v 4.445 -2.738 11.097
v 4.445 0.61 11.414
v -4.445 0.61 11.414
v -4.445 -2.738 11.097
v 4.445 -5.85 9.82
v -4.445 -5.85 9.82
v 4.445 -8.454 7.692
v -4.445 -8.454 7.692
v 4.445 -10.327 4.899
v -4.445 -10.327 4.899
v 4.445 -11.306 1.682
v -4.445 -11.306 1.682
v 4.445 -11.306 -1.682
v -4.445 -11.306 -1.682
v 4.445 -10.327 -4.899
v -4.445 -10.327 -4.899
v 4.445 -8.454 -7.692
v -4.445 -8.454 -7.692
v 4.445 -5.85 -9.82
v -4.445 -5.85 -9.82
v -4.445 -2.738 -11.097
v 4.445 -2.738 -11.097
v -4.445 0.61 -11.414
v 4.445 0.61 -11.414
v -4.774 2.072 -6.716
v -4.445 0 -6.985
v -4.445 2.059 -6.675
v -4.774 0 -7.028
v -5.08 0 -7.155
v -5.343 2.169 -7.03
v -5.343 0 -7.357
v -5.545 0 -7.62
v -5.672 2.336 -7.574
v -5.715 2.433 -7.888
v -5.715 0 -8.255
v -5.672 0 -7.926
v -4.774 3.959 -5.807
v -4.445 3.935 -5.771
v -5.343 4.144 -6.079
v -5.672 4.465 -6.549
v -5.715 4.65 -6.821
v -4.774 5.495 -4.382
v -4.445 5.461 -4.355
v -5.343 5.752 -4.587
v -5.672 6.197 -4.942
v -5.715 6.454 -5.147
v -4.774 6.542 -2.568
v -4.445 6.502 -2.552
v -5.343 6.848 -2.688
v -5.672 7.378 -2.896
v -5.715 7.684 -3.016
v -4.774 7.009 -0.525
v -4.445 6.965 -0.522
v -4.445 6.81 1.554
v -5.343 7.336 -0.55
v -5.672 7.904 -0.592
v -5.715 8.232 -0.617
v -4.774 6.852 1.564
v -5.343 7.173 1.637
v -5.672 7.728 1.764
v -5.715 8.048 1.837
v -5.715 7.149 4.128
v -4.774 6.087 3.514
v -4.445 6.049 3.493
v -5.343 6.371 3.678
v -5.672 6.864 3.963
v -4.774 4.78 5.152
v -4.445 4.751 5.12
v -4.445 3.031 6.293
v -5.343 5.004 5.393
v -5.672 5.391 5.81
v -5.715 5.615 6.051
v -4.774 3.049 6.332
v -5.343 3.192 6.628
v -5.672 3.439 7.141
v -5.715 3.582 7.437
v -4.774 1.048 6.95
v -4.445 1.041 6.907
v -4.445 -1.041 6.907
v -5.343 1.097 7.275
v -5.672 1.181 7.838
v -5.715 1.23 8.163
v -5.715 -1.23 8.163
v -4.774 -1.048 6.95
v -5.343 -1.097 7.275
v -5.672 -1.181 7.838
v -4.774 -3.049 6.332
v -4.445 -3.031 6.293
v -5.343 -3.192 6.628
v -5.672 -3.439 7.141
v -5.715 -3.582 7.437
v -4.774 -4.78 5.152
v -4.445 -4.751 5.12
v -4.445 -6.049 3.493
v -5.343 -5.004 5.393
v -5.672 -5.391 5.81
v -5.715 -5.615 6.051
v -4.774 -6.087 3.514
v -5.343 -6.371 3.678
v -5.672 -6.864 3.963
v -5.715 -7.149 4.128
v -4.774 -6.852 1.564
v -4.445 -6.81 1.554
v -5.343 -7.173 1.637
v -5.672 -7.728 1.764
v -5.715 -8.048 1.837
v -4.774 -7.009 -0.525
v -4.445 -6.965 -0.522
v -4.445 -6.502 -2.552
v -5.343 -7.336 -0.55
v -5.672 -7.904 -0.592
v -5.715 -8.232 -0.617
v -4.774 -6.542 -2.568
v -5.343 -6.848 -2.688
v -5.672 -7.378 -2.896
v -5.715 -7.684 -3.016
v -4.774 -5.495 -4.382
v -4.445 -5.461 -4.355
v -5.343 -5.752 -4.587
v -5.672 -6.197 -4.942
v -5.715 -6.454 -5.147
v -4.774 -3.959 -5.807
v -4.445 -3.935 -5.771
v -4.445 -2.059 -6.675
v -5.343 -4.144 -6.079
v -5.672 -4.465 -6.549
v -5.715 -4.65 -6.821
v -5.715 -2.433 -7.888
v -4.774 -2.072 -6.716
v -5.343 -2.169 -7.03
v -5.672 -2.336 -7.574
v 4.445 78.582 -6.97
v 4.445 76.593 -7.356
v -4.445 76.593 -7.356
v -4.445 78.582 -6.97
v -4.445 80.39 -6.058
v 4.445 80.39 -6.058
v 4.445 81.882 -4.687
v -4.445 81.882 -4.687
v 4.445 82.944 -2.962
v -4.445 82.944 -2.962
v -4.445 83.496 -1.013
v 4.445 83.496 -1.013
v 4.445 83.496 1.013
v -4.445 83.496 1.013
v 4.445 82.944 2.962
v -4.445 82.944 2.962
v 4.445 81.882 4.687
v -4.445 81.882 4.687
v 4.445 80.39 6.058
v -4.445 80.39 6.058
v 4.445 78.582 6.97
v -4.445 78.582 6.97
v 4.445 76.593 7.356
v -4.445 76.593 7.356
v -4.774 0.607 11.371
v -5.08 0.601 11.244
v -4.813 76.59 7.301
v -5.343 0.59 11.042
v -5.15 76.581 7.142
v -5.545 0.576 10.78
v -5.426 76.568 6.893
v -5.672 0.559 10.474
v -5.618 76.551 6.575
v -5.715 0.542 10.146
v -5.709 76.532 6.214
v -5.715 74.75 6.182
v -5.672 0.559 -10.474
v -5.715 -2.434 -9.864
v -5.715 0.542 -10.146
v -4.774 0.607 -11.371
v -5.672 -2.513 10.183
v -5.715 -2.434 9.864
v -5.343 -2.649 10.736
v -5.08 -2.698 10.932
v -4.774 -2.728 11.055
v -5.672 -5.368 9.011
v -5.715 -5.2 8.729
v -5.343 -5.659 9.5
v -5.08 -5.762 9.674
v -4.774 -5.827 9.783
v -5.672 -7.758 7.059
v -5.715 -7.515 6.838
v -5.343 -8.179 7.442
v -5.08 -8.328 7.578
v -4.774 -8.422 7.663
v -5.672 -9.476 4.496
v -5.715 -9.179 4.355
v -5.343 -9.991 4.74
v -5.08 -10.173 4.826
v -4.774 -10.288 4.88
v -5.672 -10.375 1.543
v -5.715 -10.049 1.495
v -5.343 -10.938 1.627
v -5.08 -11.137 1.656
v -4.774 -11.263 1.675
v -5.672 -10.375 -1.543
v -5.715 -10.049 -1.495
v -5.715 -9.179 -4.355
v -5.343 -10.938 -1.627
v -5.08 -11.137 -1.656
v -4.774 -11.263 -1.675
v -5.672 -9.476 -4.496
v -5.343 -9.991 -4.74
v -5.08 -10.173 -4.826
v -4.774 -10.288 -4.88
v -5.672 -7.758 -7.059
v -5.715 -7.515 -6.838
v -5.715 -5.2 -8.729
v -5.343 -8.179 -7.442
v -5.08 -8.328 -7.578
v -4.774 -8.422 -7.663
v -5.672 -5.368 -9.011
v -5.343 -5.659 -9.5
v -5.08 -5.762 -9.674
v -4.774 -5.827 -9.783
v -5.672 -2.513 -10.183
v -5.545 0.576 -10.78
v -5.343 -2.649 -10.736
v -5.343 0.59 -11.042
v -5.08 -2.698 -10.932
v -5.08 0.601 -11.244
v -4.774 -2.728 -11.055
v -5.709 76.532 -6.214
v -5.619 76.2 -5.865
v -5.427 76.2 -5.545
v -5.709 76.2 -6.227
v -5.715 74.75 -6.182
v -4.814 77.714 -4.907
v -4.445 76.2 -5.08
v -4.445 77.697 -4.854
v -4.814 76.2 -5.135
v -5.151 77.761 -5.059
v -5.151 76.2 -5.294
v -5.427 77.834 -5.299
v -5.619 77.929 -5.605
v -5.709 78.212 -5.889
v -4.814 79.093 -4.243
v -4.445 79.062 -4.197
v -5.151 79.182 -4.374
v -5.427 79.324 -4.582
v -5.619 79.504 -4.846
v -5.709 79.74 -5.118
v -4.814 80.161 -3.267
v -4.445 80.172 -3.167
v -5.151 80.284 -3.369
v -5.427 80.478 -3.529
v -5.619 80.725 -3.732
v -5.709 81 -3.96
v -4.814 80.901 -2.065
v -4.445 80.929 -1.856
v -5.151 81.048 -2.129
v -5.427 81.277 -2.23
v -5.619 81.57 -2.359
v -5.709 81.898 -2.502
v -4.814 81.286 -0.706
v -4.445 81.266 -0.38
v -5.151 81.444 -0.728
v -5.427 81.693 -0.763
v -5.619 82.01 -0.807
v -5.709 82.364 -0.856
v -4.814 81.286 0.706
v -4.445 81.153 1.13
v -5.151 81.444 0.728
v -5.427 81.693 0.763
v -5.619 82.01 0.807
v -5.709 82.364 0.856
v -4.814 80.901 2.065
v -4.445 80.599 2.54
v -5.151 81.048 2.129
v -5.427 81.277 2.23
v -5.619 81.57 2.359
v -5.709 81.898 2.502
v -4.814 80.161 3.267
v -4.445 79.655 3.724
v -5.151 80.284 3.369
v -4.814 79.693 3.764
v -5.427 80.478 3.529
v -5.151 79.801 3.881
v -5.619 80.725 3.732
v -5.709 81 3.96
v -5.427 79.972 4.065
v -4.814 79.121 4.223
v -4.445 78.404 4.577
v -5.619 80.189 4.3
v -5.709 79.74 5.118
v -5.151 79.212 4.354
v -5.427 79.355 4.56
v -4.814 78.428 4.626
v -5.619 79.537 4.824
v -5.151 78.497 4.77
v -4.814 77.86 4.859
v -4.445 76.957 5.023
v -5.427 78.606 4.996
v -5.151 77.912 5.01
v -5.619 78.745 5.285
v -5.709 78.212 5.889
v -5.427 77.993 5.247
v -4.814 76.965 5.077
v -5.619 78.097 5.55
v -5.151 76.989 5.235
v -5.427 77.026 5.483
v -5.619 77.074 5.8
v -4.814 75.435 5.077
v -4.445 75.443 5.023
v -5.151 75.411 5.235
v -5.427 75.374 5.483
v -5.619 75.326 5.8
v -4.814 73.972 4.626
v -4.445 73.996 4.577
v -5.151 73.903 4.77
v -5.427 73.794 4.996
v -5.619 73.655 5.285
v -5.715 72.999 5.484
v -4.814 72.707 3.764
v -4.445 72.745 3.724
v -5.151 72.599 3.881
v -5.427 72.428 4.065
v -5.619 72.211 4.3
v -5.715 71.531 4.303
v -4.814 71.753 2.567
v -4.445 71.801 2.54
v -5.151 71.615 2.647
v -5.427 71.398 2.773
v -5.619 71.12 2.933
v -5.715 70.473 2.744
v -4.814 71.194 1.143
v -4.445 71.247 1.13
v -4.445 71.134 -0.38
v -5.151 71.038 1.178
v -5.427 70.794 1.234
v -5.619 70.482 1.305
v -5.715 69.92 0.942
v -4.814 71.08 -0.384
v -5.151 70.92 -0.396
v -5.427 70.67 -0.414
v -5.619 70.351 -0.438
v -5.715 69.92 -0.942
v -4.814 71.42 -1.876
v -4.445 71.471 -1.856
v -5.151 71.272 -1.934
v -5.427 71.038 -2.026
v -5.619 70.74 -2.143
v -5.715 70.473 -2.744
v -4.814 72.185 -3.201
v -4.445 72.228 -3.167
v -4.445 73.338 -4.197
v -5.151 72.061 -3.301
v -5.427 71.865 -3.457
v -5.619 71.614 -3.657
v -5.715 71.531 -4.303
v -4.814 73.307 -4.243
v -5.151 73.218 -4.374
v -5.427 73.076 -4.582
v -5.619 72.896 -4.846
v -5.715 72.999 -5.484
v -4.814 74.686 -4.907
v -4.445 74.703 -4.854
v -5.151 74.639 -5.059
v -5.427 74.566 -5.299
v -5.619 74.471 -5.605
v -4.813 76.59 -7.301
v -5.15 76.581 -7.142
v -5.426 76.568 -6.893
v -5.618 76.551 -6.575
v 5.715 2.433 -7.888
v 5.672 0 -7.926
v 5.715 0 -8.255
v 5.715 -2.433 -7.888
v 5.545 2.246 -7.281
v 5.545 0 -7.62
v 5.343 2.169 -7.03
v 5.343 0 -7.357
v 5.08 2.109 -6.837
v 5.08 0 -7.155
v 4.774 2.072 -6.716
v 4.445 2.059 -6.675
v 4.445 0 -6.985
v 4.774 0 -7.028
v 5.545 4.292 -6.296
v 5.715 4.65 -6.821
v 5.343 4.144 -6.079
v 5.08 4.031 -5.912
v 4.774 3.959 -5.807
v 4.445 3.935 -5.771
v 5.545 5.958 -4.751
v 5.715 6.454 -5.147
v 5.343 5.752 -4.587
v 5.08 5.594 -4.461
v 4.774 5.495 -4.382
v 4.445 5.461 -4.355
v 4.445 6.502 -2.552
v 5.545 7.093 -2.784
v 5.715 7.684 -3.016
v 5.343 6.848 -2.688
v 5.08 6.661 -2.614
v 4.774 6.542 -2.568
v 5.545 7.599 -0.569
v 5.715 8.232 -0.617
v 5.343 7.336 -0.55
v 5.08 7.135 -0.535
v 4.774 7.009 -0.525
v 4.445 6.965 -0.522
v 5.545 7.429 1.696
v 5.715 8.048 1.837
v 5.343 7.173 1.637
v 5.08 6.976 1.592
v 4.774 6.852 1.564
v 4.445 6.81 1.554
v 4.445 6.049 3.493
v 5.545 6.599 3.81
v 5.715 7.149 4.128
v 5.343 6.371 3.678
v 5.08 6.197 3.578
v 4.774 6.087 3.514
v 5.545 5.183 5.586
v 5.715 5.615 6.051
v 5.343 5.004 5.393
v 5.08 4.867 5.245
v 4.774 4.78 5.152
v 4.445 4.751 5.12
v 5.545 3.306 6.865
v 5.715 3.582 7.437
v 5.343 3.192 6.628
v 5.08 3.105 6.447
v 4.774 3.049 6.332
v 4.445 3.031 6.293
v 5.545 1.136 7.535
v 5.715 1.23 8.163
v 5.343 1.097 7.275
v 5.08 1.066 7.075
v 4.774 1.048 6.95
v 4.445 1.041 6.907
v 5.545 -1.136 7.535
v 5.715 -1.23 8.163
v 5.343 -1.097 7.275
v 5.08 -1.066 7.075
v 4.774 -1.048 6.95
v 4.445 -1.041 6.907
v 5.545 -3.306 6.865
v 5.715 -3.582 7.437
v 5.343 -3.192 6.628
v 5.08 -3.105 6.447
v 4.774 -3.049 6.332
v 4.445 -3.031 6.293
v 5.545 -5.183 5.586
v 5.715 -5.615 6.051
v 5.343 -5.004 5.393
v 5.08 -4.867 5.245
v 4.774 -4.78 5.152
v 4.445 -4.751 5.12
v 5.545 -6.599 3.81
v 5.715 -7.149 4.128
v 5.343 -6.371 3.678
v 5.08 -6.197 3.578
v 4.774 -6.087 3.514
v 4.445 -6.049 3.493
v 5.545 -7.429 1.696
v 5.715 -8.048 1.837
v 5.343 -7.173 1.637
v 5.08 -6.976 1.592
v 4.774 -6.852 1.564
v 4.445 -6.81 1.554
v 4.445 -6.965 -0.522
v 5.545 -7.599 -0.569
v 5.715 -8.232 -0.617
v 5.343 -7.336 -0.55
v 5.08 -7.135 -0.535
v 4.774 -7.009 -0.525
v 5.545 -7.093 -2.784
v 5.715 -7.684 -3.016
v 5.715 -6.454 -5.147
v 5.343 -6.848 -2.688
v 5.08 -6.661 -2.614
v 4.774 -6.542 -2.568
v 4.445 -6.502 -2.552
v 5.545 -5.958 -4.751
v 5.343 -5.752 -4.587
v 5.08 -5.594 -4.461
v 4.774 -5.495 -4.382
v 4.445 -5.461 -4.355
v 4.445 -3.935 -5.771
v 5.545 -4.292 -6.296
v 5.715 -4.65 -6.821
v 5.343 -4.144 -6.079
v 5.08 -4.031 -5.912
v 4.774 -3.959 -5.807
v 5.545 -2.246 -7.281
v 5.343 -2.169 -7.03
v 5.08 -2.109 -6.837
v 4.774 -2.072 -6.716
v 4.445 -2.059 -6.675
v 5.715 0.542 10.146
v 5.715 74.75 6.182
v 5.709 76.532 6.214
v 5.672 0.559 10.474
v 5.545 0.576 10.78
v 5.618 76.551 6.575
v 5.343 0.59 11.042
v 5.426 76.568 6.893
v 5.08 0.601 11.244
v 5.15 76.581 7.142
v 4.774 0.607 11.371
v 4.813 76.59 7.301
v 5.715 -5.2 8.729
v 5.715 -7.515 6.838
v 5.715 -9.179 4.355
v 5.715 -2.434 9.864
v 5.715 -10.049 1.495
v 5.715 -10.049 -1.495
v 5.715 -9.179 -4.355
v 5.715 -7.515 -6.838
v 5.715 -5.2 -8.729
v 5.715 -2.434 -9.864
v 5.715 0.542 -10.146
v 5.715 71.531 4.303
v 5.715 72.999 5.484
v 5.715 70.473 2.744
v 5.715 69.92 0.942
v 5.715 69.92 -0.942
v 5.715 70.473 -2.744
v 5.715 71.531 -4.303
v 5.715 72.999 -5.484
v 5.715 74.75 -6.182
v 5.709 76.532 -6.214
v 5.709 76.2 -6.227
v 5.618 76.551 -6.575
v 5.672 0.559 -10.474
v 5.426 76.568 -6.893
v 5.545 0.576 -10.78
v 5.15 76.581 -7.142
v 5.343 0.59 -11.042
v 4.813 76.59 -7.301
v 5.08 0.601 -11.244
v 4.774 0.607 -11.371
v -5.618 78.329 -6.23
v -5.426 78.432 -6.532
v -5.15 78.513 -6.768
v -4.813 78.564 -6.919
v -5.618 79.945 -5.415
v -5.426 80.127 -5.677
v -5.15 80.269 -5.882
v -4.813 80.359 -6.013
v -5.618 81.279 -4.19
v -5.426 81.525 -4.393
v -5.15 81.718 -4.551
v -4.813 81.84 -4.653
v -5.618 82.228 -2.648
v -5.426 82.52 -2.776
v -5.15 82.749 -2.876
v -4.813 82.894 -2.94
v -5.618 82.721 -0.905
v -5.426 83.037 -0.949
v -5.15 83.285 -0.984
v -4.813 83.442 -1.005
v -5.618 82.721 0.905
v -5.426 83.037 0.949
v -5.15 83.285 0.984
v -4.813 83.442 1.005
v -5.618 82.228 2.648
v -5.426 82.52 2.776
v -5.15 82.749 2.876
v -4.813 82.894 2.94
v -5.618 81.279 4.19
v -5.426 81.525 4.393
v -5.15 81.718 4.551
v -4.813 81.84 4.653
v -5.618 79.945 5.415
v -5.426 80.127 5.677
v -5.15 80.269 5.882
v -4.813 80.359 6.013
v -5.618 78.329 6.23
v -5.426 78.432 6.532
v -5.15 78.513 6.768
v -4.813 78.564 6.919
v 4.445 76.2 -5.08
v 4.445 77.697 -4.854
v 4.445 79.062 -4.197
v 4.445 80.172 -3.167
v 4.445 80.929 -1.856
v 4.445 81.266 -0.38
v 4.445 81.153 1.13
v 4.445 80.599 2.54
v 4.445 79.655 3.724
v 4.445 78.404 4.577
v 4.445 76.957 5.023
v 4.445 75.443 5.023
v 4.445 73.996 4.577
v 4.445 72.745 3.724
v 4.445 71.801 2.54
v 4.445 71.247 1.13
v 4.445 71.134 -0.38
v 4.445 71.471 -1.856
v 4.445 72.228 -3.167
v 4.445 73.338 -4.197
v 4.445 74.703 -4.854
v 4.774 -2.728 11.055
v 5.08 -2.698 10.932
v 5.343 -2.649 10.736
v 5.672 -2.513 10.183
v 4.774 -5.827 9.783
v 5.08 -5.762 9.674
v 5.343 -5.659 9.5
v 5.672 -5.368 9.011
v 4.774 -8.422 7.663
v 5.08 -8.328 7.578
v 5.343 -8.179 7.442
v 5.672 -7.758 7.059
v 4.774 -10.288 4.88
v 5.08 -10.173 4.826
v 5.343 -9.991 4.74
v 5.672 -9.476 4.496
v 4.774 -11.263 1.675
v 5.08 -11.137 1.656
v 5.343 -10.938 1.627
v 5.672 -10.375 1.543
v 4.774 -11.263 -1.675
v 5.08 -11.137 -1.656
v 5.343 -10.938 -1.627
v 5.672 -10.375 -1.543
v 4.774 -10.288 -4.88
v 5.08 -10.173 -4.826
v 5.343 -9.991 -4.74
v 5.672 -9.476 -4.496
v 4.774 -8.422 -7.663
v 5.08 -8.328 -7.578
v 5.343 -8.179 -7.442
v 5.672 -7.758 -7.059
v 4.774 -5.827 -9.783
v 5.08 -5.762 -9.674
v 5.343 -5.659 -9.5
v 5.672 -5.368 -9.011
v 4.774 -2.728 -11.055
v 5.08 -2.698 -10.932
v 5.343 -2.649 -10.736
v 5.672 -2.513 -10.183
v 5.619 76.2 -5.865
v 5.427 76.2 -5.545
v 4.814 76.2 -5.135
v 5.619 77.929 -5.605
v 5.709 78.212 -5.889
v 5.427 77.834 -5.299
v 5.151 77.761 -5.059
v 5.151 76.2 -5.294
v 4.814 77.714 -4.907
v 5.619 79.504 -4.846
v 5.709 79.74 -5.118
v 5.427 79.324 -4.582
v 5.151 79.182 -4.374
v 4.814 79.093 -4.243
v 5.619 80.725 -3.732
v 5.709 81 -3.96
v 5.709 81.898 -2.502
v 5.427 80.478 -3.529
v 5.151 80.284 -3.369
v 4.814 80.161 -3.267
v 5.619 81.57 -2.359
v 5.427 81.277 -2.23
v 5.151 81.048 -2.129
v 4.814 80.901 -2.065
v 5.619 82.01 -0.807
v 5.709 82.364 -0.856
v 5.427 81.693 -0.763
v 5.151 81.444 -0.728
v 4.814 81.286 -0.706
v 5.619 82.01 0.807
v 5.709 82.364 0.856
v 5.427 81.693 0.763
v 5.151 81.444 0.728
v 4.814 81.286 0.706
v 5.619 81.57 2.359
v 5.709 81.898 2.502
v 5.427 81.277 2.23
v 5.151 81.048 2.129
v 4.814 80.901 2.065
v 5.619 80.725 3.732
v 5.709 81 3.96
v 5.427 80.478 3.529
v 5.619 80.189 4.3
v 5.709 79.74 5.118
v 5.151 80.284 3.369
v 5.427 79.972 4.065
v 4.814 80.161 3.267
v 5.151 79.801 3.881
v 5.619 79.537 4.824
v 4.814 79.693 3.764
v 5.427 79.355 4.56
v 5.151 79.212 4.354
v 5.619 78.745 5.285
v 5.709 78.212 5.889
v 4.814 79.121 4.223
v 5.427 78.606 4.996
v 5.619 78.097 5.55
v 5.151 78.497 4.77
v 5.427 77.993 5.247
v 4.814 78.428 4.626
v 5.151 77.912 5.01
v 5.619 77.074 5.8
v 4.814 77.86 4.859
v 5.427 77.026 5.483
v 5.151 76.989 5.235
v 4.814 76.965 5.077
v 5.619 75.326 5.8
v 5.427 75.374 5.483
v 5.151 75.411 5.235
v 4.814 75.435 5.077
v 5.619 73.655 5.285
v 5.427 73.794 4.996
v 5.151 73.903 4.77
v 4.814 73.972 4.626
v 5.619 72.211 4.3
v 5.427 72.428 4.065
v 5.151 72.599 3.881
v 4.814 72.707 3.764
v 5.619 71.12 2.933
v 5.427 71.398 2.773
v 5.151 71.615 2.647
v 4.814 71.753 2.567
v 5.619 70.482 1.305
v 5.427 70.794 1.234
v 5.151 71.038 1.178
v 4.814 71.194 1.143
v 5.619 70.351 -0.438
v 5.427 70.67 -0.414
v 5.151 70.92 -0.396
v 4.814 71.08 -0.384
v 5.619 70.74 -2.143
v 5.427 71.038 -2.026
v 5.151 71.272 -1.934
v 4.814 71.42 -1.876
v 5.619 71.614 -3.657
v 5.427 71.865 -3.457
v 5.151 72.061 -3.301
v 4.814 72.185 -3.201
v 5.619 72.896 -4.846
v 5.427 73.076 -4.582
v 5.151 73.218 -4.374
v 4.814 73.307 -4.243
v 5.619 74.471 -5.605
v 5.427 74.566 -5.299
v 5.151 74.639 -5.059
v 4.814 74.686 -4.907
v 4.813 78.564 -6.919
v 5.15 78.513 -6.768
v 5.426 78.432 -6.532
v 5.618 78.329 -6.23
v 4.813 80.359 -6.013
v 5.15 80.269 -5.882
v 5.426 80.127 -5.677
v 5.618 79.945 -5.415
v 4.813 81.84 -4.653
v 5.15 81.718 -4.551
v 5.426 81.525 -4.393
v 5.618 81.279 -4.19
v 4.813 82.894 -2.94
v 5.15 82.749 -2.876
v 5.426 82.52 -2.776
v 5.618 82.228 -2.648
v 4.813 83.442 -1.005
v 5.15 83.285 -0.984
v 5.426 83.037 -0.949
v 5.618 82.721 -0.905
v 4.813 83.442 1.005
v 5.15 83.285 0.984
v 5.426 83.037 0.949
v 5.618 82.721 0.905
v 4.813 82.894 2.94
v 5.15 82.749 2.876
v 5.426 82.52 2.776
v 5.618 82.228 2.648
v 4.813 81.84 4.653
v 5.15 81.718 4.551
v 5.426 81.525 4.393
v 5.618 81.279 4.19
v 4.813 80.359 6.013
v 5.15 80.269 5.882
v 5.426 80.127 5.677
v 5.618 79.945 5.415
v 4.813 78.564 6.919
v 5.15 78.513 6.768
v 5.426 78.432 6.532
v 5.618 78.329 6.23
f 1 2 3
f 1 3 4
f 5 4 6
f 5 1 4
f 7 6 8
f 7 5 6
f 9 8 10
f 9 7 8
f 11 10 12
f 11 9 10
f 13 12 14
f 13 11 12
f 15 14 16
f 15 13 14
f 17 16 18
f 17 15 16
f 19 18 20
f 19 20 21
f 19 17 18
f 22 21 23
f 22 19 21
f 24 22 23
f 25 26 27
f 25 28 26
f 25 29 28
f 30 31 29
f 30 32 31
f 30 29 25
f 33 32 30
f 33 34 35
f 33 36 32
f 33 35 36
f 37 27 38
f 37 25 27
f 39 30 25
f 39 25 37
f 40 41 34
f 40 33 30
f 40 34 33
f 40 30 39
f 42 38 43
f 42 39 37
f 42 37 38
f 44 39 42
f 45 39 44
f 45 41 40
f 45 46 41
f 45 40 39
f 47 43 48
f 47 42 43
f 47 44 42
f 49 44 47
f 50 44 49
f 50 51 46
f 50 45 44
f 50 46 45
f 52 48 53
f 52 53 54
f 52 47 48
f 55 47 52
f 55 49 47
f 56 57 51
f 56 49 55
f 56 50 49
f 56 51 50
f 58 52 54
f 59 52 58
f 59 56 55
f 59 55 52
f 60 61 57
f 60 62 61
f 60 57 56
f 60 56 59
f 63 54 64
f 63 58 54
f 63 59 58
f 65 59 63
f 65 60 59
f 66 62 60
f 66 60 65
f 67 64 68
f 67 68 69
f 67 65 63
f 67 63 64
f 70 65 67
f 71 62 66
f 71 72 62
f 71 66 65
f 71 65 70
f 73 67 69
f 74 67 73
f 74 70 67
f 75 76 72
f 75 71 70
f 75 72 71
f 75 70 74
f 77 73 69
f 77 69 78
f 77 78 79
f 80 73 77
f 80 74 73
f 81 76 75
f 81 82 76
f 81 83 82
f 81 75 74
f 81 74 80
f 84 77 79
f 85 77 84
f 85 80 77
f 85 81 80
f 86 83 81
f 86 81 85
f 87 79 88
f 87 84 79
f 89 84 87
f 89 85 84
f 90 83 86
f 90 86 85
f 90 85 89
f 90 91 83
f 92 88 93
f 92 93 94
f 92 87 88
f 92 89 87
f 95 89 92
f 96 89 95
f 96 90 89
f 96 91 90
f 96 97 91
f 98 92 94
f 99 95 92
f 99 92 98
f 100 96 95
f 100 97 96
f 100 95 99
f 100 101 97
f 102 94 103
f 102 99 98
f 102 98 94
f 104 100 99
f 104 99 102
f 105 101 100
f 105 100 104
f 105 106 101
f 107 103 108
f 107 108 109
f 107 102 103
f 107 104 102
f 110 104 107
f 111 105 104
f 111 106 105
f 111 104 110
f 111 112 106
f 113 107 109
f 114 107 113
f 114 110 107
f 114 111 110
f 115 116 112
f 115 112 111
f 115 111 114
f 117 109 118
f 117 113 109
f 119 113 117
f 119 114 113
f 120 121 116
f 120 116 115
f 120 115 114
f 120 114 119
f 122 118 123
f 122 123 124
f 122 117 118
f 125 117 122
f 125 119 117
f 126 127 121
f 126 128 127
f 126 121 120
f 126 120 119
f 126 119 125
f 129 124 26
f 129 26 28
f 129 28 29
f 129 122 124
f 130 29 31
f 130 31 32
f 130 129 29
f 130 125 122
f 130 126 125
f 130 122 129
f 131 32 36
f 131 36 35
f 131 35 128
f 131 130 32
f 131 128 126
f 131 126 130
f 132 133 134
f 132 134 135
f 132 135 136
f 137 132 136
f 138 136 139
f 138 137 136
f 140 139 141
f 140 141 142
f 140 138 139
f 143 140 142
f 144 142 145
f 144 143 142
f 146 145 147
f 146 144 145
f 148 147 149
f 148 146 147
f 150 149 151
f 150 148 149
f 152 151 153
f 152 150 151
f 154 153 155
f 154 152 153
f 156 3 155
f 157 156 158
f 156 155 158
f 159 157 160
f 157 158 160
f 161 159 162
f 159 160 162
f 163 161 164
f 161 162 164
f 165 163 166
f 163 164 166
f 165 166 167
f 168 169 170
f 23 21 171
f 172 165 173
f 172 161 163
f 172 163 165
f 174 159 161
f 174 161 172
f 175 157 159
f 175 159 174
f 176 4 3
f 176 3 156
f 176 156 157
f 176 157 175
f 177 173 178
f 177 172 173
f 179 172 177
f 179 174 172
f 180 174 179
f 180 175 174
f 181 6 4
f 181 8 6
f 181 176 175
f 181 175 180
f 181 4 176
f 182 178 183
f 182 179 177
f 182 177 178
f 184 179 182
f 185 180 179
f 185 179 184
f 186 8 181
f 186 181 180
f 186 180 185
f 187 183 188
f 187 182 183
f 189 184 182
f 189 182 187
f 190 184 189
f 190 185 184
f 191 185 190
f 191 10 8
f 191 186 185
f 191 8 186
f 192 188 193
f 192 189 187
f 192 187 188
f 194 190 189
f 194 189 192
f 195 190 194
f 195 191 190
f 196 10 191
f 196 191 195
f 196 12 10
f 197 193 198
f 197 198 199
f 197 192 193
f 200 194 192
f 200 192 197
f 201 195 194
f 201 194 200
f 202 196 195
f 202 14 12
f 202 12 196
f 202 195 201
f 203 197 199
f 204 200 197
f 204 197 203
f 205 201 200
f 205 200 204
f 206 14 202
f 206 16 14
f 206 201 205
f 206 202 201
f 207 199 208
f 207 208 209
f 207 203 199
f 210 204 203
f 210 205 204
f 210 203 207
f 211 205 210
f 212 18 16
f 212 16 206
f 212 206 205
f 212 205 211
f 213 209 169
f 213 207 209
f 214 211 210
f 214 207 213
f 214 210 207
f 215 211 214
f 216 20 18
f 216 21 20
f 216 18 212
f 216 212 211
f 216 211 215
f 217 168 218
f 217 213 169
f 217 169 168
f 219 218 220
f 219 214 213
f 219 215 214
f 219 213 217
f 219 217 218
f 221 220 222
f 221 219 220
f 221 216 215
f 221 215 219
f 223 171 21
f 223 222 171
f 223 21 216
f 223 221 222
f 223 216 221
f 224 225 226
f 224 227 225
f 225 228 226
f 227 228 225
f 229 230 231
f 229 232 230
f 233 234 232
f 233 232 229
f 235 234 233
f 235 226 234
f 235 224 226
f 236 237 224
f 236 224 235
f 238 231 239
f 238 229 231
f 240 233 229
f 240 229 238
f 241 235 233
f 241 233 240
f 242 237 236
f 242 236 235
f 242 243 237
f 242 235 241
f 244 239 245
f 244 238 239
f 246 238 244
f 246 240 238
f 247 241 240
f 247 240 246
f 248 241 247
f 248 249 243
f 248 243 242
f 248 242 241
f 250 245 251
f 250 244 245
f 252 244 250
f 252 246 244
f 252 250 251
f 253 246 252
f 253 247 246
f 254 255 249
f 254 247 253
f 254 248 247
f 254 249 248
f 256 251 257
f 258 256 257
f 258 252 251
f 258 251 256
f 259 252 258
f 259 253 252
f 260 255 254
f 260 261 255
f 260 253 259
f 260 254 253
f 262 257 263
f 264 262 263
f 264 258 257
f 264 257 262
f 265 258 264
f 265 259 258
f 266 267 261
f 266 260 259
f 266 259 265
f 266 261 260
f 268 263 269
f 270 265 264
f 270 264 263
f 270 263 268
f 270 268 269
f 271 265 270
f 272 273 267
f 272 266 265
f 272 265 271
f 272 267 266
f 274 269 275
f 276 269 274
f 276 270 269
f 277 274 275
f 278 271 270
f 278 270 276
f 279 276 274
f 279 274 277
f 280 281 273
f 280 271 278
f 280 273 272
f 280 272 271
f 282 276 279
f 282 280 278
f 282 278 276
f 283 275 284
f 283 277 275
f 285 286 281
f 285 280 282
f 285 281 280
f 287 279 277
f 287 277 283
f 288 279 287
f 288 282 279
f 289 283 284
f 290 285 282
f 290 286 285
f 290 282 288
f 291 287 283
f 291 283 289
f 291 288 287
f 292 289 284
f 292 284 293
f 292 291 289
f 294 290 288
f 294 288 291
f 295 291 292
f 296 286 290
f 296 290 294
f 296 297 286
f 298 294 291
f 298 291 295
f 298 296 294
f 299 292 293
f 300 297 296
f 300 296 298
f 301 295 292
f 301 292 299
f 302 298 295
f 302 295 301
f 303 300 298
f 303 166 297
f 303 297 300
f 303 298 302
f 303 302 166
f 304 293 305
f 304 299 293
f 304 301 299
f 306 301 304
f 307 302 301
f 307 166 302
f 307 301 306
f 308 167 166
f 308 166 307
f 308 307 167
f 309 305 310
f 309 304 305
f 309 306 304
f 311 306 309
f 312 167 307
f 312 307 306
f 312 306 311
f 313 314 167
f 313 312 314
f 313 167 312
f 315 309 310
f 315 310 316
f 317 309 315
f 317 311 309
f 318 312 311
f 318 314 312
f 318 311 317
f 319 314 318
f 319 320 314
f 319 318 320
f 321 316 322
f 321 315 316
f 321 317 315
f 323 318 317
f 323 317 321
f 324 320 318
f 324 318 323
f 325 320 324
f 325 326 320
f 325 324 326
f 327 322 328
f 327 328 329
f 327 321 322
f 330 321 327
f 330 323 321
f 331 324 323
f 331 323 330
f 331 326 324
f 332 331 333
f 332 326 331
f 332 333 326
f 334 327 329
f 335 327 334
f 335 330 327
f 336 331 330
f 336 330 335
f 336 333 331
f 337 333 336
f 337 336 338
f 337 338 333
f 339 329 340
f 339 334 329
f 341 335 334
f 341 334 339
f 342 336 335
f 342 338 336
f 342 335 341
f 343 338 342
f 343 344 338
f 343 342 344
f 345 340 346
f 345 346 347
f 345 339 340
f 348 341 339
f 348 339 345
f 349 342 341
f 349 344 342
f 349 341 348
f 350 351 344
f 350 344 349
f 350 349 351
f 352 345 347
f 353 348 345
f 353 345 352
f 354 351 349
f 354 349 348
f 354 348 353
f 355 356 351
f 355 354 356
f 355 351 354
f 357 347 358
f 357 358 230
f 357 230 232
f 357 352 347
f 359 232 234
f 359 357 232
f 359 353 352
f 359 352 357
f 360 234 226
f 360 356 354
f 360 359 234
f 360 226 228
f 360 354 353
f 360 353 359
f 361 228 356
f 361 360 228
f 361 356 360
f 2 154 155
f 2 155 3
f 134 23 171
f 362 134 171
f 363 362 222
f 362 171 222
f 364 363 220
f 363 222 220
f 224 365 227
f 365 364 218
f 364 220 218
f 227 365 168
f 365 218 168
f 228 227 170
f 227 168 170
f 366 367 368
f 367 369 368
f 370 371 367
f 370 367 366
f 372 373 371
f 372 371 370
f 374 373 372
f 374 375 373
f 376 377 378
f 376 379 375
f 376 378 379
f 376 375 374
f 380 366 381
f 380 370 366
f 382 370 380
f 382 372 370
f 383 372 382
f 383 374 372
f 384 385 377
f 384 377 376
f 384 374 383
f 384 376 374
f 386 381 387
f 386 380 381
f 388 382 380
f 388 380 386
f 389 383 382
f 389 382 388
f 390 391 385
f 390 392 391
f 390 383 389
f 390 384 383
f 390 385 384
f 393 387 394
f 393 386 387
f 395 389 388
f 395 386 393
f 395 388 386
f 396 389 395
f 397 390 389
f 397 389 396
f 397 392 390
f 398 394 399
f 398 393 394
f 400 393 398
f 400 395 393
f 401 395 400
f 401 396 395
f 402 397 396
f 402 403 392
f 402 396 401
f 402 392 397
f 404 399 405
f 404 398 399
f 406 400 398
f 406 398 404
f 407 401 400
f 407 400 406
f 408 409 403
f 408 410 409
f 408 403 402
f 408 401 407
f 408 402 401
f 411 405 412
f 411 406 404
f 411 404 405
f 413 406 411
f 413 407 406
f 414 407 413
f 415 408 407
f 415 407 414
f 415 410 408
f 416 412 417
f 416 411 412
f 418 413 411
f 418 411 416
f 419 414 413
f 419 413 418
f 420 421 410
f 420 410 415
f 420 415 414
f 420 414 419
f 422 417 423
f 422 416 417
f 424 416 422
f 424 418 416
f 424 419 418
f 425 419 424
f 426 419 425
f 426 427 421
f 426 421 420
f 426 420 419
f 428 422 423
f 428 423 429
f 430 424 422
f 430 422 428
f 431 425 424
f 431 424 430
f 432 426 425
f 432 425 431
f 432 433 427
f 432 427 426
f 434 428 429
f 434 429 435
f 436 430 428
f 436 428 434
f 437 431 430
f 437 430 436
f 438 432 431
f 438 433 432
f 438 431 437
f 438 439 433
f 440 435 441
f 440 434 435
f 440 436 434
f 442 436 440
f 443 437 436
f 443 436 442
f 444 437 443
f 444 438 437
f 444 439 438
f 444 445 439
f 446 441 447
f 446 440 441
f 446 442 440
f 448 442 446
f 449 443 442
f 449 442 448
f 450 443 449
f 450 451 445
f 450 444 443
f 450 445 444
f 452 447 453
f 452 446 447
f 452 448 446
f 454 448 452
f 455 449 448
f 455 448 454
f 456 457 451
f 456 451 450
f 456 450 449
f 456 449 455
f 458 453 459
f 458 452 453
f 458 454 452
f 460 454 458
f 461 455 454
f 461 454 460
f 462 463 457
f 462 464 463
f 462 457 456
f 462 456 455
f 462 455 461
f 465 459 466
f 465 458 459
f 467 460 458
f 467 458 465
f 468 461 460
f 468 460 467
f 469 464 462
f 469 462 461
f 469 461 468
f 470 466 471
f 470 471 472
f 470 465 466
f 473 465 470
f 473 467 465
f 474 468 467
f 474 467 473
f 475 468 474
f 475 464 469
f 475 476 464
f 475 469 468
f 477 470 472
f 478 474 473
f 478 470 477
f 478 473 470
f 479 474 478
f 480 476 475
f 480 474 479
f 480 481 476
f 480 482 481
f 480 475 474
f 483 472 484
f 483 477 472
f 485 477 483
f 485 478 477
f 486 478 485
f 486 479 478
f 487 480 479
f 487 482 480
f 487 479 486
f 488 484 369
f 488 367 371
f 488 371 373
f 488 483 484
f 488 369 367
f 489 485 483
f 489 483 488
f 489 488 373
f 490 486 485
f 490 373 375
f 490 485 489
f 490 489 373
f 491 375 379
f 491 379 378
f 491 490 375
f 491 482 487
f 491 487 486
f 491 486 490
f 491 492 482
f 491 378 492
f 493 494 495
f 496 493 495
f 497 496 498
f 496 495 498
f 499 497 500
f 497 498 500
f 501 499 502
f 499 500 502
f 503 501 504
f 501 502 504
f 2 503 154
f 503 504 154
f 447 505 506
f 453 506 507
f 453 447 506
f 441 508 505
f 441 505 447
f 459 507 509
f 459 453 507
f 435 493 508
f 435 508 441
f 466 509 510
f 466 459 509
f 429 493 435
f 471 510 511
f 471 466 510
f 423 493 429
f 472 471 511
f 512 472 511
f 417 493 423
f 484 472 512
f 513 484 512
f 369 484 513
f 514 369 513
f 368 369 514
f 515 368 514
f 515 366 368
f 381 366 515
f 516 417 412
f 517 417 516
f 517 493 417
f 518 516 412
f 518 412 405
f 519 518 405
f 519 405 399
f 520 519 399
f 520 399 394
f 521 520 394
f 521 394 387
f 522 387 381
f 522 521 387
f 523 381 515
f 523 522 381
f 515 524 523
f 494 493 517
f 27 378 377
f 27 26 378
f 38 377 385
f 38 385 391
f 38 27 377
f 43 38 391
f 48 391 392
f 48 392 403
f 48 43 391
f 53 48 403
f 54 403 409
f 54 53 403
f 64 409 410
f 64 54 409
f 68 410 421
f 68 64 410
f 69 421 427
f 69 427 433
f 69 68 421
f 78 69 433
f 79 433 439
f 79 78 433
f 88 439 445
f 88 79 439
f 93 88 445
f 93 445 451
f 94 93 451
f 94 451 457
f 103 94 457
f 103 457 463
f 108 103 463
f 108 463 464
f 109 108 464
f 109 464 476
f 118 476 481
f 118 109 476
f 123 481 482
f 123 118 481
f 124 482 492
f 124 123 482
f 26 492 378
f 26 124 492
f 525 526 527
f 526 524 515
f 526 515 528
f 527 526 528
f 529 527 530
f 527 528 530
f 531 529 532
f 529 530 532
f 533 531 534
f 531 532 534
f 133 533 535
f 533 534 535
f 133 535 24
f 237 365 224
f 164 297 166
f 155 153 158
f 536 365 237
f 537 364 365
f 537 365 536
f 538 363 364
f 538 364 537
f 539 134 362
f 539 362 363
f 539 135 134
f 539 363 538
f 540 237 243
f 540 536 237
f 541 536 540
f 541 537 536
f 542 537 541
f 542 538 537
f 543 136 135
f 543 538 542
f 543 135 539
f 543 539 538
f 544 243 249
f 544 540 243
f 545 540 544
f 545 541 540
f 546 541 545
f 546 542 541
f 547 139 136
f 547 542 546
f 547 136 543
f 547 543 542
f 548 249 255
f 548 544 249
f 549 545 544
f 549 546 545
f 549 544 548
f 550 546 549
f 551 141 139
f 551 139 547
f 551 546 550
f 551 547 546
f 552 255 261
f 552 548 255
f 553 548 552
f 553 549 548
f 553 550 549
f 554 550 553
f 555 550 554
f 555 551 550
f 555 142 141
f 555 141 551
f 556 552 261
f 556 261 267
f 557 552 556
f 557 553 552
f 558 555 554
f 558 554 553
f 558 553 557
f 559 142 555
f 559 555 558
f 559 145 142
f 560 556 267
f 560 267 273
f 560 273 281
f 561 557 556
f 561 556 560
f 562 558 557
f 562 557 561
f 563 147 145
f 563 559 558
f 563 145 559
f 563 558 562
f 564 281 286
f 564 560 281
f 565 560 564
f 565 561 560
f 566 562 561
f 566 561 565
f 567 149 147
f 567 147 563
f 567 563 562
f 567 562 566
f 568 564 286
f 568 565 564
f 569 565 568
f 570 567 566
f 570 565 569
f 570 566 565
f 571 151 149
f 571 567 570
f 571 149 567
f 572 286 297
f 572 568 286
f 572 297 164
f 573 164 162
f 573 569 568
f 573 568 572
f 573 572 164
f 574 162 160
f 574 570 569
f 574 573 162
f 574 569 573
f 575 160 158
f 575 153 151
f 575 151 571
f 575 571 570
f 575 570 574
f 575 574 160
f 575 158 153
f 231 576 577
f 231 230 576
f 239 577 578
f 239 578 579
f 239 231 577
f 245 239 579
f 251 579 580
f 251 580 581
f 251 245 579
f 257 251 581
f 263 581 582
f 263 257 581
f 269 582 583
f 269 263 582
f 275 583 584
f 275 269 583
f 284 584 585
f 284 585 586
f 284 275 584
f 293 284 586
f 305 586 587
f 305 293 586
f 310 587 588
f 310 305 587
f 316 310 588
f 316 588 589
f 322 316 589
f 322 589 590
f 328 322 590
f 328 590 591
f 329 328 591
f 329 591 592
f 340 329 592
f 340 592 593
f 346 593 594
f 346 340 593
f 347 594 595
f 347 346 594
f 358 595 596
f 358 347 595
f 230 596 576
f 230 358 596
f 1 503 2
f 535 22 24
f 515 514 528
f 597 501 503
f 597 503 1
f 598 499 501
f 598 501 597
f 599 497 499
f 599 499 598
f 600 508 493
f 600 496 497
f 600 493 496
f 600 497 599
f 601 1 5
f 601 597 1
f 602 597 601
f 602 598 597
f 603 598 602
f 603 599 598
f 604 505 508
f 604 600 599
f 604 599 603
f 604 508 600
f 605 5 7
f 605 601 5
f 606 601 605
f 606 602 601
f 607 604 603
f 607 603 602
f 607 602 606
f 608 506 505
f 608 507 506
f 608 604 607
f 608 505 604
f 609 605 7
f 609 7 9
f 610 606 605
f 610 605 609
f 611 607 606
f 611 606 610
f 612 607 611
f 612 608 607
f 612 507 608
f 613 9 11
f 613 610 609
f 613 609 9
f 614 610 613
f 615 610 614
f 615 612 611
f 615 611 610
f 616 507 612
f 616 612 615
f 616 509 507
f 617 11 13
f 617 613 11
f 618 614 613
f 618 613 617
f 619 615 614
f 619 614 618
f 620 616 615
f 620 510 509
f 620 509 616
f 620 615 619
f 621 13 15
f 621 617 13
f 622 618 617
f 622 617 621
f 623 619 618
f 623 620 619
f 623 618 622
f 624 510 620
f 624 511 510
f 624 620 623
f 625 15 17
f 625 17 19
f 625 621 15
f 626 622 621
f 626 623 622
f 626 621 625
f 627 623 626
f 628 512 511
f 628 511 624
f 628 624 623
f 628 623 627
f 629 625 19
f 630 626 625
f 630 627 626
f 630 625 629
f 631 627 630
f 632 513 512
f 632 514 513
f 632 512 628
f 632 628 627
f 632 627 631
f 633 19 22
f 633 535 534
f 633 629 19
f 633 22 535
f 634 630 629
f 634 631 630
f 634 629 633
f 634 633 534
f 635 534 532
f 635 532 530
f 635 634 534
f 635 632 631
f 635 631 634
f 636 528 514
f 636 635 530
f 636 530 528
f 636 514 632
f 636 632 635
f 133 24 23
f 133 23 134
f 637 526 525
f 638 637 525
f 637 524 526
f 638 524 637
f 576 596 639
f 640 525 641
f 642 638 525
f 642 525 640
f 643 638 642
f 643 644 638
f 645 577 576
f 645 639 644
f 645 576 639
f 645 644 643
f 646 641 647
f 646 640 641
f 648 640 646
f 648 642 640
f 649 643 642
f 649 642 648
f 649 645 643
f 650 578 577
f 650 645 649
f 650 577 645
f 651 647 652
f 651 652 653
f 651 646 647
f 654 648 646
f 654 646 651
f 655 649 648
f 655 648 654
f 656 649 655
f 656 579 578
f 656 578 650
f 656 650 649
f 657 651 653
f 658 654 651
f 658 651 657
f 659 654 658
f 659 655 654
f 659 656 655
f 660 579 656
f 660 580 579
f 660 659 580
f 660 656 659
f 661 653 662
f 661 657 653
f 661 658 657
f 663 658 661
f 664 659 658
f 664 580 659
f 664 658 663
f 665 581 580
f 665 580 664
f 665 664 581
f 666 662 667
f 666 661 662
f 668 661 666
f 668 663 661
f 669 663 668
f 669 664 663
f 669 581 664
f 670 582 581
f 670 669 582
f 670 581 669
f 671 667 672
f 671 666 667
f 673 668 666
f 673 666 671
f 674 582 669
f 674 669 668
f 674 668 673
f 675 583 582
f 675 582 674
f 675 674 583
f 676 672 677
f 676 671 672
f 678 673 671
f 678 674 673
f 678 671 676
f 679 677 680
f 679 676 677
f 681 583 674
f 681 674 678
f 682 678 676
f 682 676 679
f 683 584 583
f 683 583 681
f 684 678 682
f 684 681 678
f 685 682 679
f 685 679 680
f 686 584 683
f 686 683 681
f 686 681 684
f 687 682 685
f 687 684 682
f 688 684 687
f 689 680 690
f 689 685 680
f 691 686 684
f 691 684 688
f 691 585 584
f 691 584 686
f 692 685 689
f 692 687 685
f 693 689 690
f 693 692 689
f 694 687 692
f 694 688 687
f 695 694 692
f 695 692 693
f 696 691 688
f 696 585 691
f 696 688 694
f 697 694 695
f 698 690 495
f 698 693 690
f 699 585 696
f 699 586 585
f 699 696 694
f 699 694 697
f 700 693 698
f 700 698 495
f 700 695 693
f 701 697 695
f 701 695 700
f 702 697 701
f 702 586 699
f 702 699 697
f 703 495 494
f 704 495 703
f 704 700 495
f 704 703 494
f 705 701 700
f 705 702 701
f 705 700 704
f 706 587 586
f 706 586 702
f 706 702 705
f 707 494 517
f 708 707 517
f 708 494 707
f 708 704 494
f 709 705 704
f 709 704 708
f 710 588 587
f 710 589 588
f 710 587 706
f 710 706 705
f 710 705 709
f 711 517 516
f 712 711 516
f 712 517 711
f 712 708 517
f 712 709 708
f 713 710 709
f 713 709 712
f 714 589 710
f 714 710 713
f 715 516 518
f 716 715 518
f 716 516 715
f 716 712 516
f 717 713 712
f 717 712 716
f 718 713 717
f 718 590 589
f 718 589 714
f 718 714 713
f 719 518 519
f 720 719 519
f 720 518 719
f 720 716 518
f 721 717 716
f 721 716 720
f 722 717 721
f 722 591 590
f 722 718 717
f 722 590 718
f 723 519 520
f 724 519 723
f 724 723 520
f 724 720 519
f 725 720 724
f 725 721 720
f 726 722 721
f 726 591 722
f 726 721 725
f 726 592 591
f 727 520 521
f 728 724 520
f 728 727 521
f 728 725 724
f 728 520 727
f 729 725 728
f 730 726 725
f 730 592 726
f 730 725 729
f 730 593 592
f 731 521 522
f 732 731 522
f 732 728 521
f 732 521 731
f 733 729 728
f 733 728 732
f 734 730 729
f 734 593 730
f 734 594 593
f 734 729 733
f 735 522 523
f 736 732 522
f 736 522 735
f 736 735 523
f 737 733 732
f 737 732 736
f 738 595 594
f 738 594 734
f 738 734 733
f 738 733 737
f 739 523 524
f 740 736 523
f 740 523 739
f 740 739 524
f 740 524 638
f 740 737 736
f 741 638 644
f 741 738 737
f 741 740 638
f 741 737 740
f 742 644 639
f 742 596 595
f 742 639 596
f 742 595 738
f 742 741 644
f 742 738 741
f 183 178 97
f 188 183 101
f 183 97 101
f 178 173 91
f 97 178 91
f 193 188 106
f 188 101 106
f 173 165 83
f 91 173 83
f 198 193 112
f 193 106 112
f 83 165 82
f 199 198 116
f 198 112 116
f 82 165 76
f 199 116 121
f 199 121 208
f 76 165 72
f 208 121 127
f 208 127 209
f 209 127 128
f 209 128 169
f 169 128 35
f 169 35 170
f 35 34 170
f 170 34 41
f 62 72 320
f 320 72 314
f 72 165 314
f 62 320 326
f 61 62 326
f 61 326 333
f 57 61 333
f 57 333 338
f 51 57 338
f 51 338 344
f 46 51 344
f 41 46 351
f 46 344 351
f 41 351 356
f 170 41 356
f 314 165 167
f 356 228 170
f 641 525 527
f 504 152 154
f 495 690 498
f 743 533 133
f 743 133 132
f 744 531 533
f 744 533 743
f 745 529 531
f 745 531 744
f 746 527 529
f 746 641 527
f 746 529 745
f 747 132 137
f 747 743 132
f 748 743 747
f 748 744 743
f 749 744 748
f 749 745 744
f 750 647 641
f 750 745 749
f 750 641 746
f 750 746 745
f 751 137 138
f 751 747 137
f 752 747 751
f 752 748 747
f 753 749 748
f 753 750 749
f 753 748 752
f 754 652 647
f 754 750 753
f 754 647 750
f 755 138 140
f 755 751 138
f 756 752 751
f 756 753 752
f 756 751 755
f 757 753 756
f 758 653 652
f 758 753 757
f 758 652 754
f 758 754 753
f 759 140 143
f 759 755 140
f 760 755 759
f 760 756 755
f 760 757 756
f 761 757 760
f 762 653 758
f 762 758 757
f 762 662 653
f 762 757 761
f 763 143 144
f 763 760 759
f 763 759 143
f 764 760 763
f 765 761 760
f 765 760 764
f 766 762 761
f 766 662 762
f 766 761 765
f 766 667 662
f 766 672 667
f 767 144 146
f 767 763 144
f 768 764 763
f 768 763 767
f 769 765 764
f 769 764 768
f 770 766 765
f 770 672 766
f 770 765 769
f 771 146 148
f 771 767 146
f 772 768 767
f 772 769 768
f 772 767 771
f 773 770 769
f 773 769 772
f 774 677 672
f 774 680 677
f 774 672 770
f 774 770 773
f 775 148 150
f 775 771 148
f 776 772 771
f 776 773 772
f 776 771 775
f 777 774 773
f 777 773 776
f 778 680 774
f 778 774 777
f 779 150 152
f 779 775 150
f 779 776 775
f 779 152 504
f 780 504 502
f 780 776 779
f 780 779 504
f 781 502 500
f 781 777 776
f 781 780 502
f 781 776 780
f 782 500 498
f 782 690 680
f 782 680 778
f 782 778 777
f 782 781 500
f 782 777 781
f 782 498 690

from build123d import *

# Parameters (mm, degrees)
SKETCH1_R           = 6.985
SKETCH1_R_2         = 5.08
BOSS_EXTRUDE1_DEPTH = 5.715
FILLET1_R           = 1.27


with BuildPart() as part:
    # Sketch1 → Boss-Extrude1 (new, symmetric)
    with BuildSketch(Plane(origin=(0, 0, 0), x_dir=(0, 0, -1), z_dir=(1, 0, 0))):
        with BuildLine():
            Line((-7.355516451, 76.592853333), (-11.413732424, 0.6096))
            ThreePointArc((-11.413732424, 0.6096), (0, -11.43), (11.413732424, 0.6096))
            Line((11.413732424, 0.6096), (7.355516451, 76.592853333))
            ThreePointArc((7.355516451, 76.592853333), (0, 83.566), (-7.355516451, 76.592853333))
        make_face()
        Circle(SKETCH1_R, mode=Mode.SUBTRACT)
        with Locations((0, 76.2)):
            Circle(SKETCH1_R_2, mode=Mode.SUBTRACT)
    extrude(amount=BOSS_EXTRUDE1_DEPTH, both=True)

    # Fillet1
    # the kernel refuses this fillet: 1.27 mm, written as the material it takes off along each edge
    with BuildSketch(Plane(origin=(-5.715, 0, 0), x_dir=(0, 0, -1), z_dir=(0, -1, 0))) as fillet1_piece_1:
        with BuildLine():
            CenterArc((6.985 + FILLET1_R, FILLET1_R), FILLET1_R, 180, 90)
            Line((6.985 + FILLET1_R, 0), (6.985, 0))
            Line((6.985, 0), (6.985, FILLET1_R))
        make_face()
    revolve(axis=Axis((-5.715, 0, 0), (1, 0, 0)), mode=Mode.SUBTRACT)
    with BuildSketch(Plane(origin=(5.715, 0, 0), x_dir=(0, 0, -1), z_dir=(0, -1, 0))) as fillet1_piece_2:
        with BuildLine():
            CenterArc((6.985 + FILLET1_R, -FILLET1_R), FILLET1_R, 90, 90)
            Line((6.985, -FILLET1_R), (6.985, 0))
            Line((6.985, 0), (6.985 + FILLET1_R, 0))
        make_face()
    revolve(axis=Axis((5.715, 0, 0), (1, 0, 0)), mode=Mode.SUBTRACT)
    with BuildSketch(Plane(origin=(5.715, 0, 0), x_dir=(0, 0.05333333333333351, 0.9985767649788149), z_dir=(0, 0.9985767649788149, -0.05333333333333351))) as fillet1_piece_3:
        with BuildLine():
            CenterArc((11.43 - FILLET1_R, -FILLET1_R), FILLET1_R, 0, 90)
            Line((11.43 - FILLET1_R, 0), (11.43, 0))
            Line((11.43, 0), (11.43, -FILLET1_R))
        make_face()
    revolve(axis=Axis((5.715, 0, 0), (1, 0, 0)), revolution_arc=186.114450857, mode=Mode.SUBTRACT)
    with BuildSketch(Plane(origin=(-5.715, 76.2, 0), x_dir=(0, 0, -1), z_dir=(0, -1, 0))) as fillet1_piece_4:
        with BuildLine():
            CenterArc((5.08 + FILLET1_R, FILLET1_R), FILLET1_R, 180, 90)
            Line((5.08 + FILLET1_R, 0), (5.08, 0))
            Line((5.08, 0), (5.08, FILLET1_R))
        make_face()
    revolve(axis=Axis((-5.715, 76.2, 0), (1, 0, 0)), mode=Mode.SUBTRACT)
    with BuildSketch(Plane(origin=(5.715, 76.2, 0), x_dir=(0, 0, -1), z_dir=(0, -1, 0))) as fillet1_piece_5:
        with BuildLine():
            CenterArc((5.08 + FILLET1_R, -FILLET1_R), FILLET1_R, 90, 90)
            Line((5.08, -FILLET1_R), (5.08, 0))
            Line((5.08, 0), (5.08 + FILLET1_R, 0))
        make_face()
    revolve(axis=Axis((5.715, 76.2, 0), (1, 0, 0)), mode=Mode.SUBTRACT)
    with BuildSketch(Plane(origin=(5.715, 0.6096, -11.413732424), x_dir=(-1, 0, 0), z_dir=(0, 0.9985767649788151, 0.05333333333333325)), Plane(origin=(5.715, 76.592853333, 7.355516451), x_dir=(-1, 0, 0), z_dir=(0, -0.9985767649788151, 0.053333333333333316))) as fillet1_piece_6:
        with BuildLine():
            CenterArc((FILLET1_R, FILLET1_R), FILLET1_R, 180, 90)
            Line((0, FILLET1_R), (0, 0))
            Line((0, 0), (FILLET1_R, 0))
        make_face()
    extrude(amount=76.091549491, mode=Mode.SUBTRACT)
    with BuildSketch(Plane(origin=(5.715, 76.2, 0), x_dir=(0, 0.05333333333333354, -0.9985767649788151), z_dir=(0, -0.9985767649788151, -0.05333333333333354))) as fillet1_piece_7:
        with BuildLine():
            CenterArc((7.366 - FILLET1_R, -FILLET1_R), FILLET1_R, 0, 90)
            Line((7.366, -FILLET1_R), (7.366, 0))
            Line((7.366, 0), (7.366 - FILLET1_R, 0))
        make_face()
    revolve(axis=Axis((5.715, 76.2, 0), (1, 0, 0)), revolution_arc=173.885549143, mode=Mode.SUBTRACT)
    with BuildSketch(Plane(origin=(-5.715, 0.6096, -11.413732424), x_dir=(1, 0, 0), z_dir=(0, 0.9985767649788151, 0.05333333333333325)), Plane(origin=(-5.715, 76.592853333, 7.355516451), x_dir=(1, 0, 0), z_dir=(0, -0.9985767649788151, 0.053333333333333316))) as fillet1_piece_8:
        with BuildLine():
            CenterArc((FILLET1_R, -FILLET1_R), FILLET1_R, 90, 90)
            Line((0, -FILLET1_R), (0, 0))
            Line((0, 0), (FILLET1_R, 0))
        make_face()
    extrude(amount=76.091549491, mode=Mode.SUBTRACT)
    with BuildSketch(Plane(origin=(-5.715, 0, 0), x_dir=(0, 0.05333333333333351, 0.9985767649788149), z_dir=(0, 0.9985767649788149, -0.05333333333333351))) as fillet1_piece_9:
        with BuildLine():
            CenterArc((11.43 - FILLET1_R, FILLET1_R), FILLET1_R, 270, 90)
            Line((11.43 - FILLET1_R, 0), (11.43, 0))
            Line((11.43, 0), (11.43, FILLET1_R))
        make_face()
    revolve(axis=Axis((-5.715, 0, 0), (1, 0, 0)), revolution_arc=186.114450857, mode=Mode.SUBTRACT)
    with BuildSketch(Plane(origin=(-5.715, 76.2, 0), x_dir=(0, 0.05333333333333354, -0.9985767649788151), z_dir=(0, -0.9985767649788151, -0.05333333333333354))) as fillet1_piece_10:
        with BuildLine():
            CenterArc((7.366 - FILLET1_R, FILLET1_R), FILLET1_R, 270, 90)
            Line((7.366 - FILLET1_R, 0), (7.366, 0))
            Line((7.366, 0), (7.366, FILLET1_R))
        make_face()
    revolve(axis=Axis((-5.715, 76.2, 0), (1, 0, 0)), revolution_arc=173.885549143, mode=Mode.SUBTRACT)


solid = part.part
